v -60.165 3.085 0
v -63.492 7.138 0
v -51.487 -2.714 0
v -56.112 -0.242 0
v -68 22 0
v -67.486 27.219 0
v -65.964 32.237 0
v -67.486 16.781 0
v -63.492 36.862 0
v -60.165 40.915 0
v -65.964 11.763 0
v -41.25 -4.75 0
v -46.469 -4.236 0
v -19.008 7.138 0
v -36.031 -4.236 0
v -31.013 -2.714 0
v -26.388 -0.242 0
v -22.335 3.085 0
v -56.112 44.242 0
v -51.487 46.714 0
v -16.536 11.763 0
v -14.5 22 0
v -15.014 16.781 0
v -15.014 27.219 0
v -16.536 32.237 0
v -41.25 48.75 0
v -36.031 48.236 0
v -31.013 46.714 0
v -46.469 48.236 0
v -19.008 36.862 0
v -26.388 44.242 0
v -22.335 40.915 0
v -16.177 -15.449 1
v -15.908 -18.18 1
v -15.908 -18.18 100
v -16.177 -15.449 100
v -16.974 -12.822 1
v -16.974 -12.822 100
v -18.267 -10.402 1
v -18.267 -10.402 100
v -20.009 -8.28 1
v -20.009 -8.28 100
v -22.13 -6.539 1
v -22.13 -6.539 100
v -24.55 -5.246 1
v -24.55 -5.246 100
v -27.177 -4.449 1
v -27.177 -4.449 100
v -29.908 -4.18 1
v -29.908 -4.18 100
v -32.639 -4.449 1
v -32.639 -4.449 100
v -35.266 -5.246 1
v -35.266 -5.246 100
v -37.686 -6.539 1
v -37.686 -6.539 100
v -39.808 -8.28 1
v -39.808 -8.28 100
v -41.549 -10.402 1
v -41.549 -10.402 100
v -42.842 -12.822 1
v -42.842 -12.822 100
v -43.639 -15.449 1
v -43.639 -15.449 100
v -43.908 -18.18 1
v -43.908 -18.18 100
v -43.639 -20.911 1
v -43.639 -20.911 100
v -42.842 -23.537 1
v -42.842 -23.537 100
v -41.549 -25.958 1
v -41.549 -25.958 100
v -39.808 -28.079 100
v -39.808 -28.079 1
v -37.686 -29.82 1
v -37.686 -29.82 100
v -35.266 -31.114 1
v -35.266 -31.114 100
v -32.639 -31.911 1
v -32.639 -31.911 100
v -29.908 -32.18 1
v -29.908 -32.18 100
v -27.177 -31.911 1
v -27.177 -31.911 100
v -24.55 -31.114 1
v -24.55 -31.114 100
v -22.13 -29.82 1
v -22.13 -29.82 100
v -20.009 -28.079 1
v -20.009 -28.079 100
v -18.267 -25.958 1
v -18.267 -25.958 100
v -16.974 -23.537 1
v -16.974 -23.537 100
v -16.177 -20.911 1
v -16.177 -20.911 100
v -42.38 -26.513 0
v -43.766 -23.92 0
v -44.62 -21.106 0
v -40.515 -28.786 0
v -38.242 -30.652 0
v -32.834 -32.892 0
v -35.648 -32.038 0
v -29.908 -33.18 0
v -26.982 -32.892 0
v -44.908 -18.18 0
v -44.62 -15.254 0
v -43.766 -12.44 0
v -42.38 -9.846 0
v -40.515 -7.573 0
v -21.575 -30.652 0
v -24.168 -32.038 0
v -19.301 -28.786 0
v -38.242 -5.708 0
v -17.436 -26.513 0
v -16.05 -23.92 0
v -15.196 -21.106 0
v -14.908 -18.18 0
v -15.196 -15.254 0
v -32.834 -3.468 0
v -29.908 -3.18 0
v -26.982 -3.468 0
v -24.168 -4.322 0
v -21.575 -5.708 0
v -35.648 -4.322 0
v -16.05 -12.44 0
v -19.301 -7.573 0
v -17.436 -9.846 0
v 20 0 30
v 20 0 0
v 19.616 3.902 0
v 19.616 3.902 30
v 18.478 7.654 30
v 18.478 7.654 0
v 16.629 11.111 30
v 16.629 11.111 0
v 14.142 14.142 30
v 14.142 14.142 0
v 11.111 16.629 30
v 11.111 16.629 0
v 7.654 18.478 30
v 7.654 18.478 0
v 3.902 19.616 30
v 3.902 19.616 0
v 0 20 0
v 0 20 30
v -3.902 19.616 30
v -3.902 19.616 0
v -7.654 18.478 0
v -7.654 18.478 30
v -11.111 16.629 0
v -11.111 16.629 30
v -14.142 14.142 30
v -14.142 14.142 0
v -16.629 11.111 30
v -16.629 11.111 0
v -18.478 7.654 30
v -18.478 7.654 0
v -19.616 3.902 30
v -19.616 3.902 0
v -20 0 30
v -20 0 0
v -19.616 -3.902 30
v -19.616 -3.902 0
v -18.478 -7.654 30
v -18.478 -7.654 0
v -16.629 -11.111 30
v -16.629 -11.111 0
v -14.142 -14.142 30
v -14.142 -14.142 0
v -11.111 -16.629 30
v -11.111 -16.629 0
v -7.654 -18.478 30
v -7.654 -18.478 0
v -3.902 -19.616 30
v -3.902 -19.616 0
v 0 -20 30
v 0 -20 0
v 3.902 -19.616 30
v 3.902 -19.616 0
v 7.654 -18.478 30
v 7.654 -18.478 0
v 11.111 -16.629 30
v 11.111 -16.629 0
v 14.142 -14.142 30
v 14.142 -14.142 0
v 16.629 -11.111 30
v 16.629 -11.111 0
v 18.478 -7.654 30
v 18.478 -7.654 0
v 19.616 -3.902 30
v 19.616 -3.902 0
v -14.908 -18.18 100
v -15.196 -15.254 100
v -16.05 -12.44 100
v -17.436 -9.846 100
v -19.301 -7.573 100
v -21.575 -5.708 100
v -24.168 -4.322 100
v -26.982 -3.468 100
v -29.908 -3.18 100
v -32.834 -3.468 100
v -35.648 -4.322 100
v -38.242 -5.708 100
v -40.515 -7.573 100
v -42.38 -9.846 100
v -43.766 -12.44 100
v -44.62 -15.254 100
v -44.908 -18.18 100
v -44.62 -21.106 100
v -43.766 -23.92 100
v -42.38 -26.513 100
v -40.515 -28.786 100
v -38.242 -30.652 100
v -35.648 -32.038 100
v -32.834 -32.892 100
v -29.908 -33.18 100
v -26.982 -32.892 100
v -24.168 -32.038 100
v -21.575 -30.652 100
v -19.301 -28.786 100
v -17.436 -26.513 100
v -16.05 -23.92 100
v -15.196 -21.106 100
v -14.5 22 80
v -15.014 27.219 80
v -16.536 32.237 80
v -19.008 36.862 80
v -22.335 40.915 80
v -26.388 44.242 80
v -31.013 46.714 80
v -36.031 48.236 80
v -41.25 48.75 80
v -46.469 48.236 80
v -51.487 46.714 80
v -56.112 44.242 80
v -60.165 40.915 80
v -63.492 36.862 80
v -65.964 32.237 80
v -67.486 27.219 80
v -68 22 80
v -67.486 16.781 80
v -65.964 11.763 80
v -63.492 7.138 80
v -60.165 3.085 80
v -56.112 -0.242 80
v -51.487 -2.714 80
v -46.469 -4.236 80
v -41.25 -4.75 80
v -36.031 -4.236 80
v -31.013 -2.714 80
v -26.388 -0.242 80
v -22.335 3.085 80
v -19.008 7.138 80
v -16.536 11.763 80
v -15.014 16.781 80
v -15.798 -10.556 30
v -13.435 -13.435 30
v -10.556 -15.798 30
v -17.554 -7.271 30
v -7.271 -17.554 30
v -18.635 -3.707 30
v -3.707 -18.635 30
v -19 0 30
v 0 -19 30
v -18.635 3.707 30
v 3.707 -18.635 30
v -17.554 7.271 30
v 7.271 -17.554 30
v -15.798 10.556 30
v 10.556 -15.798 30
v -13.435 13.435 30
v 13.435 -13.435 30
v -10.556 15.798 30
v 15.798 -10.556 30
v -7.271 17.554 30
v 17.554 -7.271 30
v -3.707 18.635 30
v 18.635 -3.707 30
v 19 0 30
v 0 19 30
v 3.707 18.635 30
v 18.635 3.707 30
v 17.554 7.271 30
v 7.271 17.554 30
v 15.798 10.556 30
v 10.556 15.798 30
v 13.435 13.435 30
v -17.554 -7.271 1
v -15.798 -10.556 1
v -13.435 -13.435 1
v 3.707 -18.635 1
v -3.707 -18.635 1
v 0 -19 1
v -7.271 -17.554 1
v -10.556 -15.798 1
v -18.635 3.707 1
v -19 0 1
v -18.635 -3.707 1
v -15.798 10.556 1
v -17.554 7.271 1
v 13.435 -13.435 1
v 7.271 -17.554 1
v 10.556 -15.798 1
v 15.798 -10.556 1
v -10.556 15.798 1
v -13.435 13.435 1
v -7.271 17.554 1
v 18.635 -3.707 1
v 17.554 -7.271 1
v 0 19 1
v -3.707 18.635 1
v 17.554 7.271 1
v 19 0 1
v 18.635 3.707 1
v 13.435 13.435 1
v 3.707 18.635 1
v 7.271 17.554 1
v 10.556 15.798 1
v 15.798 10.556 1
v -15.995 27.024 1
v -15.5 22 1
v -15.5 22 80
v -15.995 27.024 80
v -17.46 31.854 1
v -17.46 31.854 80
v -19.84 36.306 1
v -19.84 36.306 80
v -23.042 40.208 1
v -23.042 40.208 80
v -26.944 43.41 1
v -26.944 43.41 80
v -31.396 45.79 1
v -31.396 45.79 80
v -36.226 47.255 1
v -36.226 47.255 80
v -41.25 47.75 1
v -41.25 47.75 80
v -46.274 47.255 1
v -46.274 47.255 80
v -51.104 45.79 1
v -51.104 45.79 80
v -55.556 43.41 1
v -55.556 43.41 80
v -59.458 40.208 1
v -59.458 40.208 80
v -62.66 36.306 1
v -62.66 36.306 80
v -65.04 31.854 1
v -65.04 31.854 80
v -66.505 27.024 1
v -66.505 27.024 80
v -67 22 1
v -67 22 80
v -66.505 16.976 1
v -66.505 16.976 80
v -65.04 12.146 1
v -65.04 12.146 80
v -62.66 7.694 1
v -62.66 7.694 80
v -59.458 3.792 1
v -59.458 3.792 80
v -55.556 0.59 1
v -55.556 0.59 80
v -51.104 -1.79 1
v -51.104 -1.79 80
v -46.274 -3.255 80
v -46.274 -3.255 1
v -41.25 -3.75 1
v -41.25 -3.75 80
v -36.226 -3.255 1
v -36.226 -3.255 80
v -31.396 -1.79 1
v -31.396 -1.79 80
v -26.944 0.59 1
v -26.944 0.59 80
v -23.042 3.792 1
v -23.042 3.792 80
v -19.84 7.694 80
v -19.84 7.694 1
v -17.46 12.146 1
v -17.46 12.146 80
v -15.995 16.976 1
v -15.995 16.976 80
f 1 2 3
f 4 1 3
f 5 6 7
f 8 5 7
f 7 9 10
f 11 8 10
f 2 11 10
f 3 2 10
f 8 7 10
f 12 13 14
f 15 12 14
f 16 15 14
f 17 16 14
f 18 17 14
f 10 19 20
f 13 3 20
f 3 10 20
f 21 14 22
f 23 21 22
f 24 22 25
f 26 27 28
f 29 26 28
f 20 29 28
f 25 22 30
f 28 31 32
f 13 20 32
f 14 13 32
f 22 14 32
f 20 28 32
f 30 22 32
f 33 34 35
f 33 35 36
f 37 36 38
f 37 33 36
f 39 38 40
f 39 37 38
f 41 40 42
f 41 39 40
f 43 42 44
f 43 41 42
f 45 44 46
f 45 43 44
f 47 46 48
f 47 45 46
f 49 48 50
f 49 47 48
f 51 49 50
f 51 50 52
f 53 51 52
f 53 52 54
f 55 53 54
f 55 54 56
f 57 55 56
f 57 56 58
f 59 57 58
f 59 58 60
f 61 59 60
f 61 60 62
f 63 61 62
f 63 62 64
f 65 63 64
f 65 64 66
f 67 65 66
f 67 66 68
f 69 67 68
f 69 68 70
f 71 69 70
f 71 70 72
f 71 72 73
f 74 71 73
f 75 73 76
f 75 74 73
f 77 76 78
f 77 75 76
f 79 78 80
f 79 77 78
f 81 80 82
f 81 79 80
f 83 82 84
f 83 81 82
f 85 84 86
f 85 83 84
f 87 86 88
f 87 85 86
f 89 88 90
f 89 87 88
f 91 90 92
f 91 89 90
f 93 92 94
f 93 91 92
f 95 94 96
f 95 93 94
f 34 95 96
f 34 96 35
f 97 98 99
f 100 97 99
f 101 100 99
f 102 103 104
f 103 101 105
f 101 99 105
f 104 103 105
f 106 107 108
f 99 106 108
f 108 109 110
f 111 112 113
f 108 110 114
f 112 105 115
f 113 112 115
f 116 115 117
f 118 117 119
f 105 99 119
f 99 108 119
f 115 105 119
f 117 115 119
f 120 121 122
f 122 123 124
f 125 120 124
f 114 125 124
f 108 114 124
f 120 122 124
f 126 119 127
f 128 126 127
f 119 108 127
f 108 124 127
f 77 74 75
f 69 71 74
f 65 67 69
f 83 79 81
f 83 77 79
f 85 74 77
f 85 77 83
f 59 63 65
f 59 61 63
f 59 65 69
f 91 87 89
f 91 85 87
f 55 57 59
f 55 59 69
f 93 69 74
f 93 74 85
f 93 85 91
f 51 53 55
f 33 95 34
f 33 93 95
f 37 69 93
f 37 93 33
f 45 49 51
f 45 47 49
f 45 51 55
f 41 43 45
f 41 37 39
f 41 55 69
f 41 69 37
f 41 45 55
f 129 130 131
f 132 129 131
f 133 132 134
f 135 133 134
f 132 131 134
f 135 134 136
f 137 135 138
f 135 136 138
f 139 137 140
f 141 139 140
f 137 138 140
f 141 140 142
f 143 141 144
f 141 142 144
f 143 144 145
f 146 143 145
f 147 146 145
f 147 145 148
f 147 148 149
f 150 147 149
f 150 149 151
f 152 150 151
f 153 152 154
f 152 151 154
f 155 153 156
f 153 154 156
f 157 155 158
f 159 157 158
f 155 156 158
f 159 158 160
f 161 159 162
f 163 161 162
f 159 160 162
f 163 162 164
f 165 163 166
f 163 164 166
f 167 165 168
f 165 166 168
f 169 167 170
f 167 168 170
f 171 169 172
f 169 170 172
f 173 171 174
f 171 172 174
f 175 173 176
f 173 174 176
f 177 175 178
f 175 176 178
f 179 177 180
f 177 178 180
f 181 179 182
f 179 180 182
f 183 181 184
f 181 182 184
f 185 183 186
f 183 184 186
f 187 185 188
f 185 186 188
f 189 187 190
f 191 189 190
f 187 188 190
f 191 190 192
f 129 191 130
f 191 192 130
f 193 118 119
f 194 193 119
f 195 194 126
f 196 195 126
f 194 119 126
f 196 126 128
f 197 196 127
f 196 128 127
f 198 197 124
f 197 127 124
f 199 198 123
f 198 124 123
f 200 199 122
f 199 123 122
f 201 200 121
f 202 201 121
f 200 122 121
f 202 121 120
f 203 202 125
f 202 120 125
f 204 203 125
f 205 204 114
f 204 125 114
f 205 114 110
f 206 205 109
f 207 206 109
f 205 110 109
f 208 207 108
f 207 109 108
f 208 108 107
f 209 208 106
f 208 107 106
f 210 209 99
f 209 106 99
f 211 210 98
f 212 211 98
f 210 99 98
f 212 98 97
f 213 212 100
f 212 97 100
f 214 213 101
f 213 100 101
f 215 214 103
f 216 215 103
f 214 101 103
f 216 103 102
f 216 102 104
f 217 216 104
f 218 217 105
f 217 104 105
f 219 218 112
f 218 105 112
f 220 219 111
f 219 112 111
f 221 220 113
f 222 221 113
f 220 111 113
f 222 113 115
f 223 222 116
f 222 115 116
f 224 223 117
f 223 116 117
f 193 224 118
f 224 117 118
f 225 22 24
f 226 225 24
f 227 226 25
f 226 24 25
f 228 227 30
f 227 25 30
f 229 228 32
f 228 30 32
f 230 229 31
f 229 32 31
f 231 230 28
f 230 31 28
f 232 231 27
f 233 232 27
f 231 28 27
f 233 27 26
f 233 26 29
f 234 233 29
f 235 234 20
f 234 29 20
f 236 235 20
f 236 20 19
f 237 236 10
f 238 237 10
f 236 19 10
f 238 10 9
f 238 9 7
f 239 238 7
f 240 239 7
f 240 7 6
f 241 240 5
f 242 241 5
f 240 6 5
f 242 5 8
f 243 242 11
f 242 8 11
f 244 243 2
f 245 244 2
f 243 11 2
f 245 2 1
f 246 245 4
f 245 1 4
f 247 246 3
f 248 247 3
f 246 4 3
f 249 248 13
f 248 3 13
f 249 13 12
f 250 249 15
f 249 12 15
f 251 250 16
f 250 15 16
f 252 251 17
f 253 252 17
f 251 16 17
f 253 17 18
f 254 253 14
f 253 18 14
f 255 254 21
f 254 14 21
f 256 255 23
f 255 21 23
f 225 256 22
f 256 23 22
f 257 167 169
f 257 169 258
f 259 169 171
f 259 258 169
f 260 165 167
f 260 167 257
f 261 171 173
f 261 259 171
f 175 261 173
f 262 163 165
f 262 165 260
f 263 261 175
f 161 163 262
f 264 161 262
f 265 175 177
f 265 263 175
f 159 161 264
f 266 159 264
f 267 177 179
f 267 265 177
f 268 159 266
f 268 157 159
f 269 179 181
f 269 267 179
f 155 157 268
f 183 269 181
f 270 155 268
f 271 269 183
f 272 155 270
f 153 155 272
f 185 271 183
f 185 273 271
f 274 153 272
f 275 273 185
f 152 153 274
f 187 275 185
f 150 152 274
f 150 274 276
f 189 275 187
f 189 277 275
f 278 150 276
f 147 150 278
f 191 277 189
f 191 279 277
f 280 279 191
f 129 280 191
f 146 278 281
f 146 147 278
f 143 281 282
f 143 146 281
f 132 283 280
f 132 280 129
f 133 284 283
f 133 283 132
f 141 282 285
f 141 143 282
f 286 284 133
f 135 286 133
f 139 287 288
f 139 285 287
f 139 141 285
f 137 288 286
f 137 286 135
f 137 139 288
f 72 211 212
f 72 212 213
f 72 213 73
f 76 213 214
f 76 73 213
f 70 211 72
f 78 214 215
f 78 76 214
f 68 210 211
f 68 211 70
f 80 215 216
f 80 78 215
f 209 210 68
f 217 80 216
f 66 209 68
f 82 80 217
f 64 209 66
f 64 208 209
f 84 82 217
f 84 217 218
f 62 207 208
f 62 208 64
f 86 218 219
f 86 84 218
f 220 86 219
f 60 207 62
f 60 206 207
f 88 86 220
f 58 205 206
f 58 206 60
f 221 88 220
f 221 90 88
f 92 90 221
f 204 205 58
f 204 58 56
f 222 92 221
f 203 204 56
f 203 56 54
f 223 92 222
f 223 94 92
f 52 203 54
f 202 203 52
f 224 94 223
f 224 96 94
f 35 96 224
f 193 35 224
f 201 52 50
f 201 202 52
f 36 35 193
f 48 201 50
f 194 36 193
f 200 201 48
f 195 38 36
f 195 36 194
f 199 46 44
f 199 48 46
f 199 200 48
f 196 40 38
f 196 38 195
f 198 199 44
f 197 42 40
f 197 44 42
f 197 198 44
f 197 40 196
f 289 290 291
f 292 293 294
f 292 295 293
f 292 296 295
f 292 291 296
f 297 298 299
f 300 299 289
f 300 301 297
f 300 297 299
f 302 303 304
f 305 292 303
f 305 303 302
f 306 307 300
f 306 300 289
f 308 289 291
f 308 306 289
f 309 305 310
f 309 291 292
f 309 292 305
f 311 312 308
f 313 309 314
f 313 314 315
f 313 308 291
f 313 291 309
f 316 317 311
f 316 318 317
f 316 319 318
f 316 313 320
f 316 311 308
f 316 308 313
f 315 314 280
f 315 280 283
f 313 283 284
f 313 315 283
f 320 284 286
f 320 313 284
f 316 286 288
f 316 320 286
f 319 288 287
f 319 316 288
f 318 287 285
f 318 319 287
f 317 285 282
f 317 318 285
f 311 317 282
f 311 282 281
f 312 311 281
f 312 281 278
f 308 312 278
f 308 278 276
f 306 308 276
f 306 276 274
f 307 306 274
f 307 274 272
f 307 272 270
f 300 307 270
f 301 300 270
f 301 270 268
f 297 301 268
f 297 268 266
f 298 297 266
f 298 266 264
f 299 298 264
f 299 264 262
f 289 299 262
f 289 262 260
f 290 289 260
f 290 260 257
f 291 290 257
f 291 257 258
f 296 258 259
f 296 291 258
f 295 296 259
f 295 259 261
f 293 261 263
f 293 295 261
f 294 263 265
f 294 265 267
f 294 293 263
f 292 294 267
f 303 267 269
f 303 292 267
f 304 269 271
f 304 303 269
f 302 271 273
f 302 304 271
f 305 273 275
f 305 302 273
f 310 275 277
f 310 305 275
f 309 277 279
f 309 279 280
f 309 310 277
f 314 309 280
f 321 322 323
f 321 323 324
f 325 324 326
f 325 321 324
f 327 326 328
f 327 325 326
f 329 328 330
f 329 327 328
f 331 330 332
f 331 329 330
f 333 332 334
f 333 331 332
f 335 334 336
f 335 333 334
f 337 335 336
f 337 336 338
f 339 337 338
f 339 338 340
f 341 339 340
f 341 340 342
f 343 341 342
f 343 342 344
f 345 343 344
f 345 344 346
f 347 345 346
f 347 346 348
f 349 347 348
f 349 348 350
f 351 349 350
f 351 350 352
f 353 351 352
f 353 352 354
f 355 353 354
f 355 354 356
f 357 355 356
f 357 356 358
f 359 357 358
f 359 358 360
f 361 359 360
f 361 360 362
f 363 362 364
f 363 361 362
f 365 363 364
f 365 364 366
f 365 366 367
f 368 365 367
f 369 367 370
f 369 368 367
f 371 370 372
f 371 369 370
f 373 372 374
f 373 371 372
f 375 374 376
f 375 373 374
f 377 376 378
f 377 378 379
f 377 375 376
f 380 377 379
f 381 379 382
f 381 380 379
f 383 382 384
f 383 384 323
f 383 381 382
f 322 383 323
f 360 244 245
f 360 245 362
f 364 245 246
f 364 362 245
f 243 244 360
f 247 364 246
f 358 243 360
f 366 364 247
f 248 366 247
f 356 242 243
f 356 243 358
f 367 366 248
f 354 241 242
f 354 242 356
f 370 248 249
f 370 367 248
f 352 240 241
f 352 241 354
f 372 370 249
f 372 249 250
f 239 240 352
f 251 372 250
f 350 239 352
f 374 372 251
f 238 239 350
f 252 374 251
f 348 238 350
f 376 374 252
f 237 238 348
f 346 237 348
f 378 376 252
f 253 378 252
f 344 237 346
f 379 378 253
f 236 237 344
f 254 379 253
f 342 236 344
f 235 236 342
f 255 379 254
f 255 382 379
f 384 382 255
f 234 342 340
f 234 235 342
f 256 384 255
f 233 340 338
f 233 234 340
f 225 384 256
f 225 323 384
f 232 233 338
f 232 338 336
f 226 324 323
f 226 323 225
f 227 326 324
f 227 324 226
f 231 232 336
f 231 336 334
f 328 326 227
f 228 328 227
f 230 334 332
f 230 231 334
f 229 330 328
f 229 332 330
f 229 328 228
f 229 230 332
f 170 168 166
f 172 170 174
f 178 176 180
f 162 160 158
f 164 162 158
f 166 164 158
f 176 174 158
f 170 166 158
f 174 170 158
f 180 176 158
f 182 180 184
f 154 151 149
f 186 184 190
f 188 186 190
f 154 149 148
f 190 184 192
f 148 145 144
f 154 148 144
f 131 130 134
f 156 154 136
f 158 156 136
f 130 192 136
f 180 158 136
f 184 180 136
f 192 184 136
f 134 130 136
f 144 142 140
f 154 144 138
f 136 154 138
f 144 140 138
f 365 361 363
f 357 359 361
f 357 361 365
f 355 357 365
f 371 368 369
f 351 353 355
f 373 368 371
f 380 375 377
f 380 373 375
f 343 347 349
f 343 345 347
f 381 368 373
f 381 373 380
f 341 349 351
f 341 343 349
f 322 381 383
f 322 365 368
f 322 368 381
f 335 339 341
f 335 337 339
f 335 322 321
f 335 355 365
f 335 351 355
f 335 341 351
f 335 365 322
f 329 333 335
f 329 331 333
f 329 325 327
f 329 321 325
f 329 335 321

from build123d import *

# Parameters (mm, degrees)
F0_R     = 20
F1_DEPTH = 30
F2_T     = -1
F3_R     = 26.75
F4_DEPTH = 80
F5_T     = -1
F6_R     = 15
F7_DEPTH = 100
F8_T     = -1


with BuildPart() as f1:
    # F0 (on Top) → F1 (new body)
    with BuildSketch(Plane.XY):
        Circle(F0_R)
    extrude(amount=F1_DEPTH)

    # F2
    f2_openings = [f1.faces().sort_by_distance(p)[0] for p in [
        (0, 0, 30),
    ]]
    offset(amount=F2_T, openings=f2_openings)


with BuildPart() as f4:
    # F3 (on Top) → F4 (new body)
    with BuildSketch(Plane.XY):
        with Locations((-41.25, 22)):
            Circle(F3_R)
    extrude(amount=F4_DEPTH)

    # F5
    f5_openings = [f4.faces().sort_by_distance(p)[0] for p in [
        (-41.25, 22, 80),
    ]]
    offset(amount=F5_T, openings=f5_openings)


with BuildPart() as f7:
    # F6 (on Top) → F7 (new body)
    with BuildSketch(Plane.XY):
        with Locations((-29.9080578136, -18.1798811277)):
            Circle(F6_R)
    extrude(amount=F7_DEPTH)

    # F8
    f8_openings = [f7.faces().sort_by_distance(p)[0] for p in [
        (-29.908058, -18.179881, 100),
    ]]
    offset(amount=F8_T, openings=f8_openings)


solid = Compound([f1.part, f4.part, f7.part])
